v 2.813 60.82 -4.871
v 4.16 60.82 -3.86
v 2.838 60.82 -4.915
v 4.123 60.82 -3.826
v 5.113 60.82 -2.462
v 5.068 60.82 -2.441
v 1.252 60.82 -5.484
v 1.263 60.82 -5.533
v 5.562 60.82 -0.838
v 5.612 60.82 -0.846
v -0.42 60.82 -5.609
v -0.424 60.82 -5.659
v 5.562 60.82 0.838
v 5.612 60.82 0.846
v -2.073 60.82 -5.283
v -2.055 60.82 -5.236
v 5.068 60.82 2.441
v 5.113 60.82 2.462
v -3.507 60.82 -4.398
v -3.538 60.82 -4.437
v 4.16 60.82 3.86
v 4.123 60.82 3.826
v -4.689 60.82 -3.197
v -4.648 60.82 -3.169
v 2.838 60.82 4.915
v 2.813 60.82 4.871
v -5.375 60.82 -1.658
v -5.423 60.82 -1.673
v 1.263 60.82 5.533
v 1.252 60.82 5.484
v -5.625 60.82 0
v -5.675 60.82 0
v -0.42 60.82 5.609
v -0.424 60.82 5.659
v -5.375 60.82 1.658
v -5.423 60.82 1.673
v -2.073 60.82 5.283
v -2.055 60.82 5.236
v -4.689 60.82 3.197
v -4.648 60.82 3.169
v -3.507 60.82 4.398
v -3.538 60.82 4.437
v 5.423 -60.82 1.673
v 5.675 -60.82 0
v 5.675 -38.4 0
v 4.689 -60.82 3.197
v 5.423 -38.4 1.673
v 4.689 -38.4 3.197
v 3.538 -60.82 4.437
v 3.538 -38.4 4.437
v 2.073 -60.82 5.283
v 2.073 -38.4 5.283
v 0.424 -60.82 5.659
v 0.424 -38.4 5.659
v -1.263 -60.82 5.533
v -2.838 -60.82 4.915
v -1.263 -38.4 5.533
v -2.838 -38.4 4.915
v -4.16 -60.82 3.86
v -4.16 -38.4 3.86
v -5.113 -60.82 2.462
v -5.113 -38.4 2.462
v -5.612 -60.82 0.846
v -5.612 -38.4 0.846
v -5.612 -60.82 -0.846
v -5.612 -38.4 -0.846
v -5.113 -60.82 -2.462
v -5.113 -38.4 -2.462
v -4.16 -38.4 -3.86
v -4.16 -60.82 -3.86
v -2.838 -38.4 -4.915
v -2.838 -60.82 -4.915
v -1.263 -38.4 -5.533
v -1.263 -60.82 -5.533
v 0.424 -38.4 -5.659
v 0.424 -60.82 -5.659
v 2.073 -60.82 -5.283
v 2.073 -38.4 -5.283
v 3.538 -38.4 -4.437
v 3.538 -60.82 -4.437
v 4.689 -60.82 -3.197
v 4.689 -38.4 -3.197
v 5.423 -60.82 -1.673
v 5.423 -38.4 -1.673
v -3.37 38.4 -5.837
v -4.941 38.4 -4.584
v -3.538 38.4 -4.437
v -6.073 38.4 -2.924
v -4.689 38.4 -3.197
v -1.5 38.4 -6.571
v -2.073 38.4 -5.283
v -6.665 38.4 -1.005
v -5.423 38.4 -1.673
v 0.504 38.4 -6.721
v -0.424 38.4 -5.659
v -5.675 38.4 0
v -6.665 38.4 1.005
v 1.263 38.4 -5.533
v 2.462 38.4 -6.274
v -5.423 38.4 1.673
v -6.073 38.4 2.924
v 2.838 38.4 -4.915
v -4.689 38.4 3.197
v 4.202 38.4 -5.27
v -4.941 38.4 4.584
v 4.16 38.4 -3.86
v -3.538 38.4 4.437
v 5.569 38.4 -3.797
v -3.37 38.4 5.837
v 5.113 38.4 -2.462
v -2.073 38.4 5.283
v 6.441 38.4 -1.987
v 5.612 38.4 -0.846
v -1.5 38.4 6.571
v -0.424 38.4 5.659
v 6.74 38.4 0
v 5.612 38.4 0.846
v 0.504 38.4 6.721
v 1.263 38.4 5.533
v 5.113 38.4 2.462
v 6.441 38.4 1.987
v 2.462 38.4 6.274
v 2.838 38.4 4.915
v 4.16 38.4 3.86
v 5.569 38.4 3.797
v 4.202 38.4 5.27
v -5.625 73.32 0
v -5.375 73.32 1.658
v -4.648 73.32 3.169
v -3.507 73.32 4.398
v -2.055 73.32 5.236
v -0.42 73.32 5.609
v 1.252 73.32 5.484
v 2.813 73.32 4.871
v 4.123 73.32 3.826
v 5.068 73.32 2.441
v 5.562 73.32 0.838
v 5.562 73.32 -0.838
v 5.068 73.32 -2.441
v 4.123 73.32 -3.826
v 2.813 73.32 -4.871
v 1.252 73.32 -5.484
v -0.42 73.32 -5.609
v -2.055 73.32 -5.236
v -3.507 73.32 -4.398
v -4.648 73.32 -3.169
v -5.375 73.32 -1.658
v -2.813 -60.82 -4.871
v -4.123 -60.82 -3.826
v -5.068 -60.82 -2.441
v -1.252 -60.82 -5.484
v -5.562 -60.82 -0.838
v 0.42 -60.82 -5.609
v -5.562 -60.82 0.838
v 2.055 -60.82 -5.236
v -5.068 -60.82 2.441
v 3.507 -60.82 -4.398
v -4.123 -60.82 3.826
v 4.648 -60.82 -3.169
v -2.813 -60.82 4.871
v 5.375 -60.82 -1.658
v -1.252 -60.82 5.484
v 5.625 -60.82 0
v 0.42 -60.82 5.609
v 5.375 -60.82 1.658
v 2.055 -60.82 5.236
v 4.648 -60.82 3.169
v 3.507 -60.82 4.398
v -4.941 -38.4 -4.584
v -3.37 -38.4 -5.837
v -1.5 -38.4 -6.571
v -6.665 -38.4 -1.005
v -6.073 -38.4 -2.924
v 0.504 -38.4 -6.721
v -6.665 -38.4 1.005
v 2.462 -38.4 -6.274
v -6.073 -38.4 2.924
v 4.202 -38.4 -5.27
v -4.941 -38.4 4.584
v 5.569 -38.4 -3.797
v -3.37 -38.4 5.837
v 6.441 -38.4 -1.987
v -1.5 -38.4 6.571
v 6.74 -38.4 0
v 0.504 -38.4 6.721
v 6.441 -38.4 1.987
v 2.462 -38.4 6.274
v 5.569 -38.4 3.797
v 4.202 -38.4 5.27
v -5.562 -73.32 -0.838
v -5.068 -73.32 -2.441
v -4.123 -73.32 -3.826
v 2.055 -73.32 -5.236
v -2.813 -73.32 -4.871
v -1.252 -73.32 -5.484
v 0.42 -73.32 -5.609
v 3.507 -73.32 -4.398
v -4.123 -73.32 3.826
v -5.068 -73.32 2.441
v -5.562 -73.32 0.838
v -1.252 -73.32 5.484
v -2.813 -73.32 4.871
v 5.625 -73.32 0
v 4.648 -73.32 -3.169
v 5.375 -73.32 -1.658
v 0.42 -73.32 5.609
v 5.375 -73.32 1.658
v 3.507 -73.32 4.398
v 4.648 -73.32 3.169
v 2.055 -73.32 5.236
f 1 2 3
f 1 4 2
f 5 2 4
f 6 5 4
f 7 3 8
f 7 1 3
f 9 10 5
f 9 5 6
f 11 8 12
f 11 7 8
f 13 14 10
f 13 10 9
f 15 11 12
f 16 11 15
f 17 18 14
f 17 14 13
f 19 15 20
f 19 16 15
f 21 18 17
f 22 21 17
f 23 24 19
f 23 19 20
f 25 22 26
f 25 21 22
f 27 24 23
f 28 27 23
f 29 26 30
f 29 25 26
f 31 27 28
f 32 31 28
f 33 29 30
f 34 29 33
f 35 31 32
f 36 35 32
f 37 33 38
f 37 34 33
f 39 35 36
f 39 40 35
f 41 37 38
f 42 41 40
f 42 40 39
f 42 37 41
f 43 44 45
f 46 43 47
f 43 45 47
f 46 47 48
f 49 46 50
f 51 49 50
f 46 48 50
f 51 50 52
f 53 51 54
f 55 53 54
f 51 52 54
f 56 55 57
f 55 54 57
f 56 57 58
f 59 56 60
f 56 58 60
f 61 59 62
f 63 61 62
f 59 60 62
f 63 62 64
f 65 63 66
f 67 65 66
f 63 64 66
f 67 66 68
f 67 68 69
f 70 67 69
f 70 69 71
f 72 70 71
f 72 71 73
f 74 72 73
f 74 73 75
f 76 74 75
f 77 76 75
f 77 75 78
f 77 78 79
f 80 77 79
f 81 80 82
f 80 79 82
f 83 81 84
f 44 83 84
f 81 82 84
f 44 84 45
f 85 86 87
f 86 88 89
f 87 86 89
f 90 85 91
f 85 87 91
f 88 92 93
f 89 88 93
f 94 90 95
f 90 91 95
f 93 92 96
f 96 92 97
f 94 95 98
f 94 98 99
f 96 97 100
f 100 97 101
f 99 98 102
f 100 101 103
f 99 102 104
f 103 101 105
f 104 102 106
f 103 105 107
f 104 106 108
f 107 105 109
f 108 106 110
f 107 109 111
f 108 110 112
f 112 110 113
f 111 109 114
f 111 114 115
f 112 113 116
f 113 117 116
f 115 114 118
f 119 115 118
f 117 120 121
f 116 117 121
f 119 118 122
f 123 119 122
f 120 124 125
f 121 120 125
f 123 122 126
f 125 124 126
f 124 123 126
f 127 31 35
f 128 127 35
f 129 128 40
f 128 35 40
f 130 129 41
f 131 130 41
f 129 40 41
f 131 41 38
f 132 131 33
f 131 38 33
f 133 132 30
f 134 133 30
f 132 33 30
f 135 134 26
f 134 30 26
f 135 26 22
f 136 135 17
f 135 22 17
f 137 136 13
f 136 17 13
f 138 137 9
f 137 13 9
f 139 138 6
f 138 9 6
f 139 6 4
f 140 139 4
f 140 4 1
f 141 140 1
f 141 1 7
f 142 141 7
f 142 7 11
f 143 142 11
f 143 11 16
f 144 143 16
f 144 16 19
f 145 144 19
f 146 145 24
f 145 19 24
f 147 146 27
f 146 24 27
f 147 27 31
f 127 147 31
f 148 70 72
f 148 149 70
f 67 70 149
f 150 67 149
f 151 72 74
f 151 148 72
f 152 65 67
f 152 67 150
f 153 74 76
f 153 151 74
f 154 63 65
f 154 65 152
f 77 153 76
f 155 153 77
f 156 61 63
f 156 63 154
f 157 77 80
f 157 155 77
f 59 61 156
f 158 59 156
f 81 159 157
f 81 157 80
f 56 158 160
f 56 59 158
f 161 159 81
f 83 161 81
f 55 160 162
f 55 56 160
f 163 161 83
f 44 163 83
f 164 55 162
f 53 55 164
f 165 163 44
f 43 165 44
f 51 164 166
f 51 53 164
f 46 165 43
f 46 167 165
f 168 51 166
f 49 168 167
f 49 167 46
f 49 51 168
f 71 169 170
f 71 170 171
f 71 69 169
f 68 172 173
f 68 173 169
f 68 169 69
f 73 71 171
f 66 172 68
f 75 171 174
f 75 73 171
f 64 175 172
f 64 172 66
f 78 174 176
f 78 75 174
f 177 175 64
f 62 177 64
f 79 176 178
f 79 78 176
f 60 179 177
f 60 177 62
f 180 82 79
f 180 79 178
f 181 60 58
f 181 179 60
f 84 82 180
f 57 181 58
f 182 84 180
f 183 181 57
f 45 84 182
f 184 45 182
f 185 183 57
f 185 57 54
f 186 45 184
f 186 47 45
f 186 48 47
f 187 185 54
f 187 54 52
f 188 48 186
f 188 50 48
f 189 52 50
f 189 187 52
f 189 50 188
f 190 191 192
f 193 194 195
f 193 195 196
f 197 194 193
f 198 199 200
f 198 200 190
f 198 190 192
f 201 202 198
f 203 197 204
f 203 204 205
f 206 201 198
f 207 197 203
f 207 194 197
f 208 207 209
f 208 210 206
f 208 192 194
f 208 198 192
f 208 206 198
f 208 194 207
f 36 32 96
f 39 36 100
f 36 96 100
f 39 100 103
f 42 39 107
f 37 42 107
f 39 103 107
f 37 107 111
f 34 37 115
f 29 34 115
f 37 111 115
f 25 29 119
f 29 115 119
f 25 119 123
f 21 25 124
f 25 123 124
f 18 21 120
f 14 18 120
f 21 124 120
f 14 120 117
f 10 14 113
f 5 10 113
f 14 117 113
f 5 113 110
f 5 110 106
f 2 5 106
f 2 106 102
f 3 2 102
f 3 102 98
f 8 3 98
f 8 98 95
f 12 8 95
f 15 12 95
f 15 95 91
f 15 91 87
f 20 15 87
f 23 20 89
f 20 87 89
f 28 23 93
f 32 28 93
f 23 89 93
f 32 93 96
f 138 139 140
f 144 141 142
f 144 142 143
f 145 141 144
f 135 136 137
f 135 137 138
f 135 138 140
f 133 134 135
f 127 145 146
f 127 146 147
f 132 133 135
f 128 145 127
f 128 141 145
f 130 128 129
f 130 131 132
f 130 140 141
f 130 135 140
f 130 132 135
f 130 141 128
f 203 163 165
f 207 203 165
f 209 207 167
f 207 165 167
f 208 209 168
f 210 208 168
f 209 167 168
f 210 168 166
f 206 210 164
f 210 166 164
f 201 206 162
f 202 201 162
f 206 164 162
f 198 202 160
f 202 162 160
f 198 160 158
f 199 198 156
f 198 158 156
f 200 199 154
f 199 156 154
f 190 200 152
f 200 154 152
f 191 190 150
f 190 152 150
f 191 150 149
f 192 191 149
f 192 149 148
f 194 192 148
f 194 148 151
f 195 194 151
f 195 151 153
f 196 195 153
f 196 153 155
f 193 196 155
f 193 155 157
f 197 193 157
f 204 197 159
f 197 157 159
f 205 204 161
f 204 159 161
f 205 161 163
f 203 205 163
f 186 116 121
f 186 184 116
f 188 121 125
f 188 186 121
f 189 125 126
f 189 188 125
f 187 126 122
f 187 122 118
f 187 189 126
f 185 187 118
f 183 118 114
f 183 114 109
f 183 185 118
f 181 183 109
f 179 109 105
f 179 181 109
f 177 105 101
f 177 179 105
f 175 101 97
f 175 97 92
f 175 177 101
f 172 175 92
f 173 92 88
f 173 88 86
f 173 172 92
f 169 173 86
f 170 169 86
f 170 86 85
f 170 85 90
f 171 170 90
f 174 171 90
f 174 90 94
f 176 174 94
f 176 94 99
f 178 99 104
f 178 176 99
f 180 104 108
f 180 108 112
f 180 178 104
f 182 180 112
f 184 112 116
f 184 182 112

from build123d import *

# Parameters (mm, degrees)
F0_R     = 6.74
F1_DEPTH = 38.4
F2_R     = 5.675
F3_DEPTH = 22.42
F4_R     = 5.625
F5_DEPTH = 12.5
F6_R     = 5.675
F7_DEPTH = 22.42
F8_R     = 5.625
F9_DEPTH = 12.5


with BuildPart() as f1:
    # F0 (on Front) → F1 (new body, symmetric)
    with BuildSketch(Plane.XZ):
        Circle(F0_R)
    extrude(amount=F1_DEPTH, both=True)

    # F2 (on face) → F3 (join)
    with BuildSketch(Plane(origin=(0, 38.4, 0), x_dir=(-1, 0, 0), z_dir=(0, 1, 0))):
        Circle(F2_R)
    extrude(amount=F3_DEPTH)

    # F4 (on face) → F5 (join)
    with BuildSketch(Plane(origin=(0, 60.82, 0), x_dir=(-1, 0, 0), z_dir=(0, 1, 0))):
        Circle(F4_R)
    extrude(amount=F5_DEPTH)

    # F6 (on face) → F7 (join)
    with BuildSketch(Plane.XZ.offset(38.4)):
        Circle(F6_R)
    extrude(amount=F7_DEPTH)

    # F8 (on face) → F9 (join)
    with BuildSketch(Plane.XZ.offset(60.82)):
        Circle(F8_R)
    extrude(amount=F9_DEPTH)


solid = f1.part
